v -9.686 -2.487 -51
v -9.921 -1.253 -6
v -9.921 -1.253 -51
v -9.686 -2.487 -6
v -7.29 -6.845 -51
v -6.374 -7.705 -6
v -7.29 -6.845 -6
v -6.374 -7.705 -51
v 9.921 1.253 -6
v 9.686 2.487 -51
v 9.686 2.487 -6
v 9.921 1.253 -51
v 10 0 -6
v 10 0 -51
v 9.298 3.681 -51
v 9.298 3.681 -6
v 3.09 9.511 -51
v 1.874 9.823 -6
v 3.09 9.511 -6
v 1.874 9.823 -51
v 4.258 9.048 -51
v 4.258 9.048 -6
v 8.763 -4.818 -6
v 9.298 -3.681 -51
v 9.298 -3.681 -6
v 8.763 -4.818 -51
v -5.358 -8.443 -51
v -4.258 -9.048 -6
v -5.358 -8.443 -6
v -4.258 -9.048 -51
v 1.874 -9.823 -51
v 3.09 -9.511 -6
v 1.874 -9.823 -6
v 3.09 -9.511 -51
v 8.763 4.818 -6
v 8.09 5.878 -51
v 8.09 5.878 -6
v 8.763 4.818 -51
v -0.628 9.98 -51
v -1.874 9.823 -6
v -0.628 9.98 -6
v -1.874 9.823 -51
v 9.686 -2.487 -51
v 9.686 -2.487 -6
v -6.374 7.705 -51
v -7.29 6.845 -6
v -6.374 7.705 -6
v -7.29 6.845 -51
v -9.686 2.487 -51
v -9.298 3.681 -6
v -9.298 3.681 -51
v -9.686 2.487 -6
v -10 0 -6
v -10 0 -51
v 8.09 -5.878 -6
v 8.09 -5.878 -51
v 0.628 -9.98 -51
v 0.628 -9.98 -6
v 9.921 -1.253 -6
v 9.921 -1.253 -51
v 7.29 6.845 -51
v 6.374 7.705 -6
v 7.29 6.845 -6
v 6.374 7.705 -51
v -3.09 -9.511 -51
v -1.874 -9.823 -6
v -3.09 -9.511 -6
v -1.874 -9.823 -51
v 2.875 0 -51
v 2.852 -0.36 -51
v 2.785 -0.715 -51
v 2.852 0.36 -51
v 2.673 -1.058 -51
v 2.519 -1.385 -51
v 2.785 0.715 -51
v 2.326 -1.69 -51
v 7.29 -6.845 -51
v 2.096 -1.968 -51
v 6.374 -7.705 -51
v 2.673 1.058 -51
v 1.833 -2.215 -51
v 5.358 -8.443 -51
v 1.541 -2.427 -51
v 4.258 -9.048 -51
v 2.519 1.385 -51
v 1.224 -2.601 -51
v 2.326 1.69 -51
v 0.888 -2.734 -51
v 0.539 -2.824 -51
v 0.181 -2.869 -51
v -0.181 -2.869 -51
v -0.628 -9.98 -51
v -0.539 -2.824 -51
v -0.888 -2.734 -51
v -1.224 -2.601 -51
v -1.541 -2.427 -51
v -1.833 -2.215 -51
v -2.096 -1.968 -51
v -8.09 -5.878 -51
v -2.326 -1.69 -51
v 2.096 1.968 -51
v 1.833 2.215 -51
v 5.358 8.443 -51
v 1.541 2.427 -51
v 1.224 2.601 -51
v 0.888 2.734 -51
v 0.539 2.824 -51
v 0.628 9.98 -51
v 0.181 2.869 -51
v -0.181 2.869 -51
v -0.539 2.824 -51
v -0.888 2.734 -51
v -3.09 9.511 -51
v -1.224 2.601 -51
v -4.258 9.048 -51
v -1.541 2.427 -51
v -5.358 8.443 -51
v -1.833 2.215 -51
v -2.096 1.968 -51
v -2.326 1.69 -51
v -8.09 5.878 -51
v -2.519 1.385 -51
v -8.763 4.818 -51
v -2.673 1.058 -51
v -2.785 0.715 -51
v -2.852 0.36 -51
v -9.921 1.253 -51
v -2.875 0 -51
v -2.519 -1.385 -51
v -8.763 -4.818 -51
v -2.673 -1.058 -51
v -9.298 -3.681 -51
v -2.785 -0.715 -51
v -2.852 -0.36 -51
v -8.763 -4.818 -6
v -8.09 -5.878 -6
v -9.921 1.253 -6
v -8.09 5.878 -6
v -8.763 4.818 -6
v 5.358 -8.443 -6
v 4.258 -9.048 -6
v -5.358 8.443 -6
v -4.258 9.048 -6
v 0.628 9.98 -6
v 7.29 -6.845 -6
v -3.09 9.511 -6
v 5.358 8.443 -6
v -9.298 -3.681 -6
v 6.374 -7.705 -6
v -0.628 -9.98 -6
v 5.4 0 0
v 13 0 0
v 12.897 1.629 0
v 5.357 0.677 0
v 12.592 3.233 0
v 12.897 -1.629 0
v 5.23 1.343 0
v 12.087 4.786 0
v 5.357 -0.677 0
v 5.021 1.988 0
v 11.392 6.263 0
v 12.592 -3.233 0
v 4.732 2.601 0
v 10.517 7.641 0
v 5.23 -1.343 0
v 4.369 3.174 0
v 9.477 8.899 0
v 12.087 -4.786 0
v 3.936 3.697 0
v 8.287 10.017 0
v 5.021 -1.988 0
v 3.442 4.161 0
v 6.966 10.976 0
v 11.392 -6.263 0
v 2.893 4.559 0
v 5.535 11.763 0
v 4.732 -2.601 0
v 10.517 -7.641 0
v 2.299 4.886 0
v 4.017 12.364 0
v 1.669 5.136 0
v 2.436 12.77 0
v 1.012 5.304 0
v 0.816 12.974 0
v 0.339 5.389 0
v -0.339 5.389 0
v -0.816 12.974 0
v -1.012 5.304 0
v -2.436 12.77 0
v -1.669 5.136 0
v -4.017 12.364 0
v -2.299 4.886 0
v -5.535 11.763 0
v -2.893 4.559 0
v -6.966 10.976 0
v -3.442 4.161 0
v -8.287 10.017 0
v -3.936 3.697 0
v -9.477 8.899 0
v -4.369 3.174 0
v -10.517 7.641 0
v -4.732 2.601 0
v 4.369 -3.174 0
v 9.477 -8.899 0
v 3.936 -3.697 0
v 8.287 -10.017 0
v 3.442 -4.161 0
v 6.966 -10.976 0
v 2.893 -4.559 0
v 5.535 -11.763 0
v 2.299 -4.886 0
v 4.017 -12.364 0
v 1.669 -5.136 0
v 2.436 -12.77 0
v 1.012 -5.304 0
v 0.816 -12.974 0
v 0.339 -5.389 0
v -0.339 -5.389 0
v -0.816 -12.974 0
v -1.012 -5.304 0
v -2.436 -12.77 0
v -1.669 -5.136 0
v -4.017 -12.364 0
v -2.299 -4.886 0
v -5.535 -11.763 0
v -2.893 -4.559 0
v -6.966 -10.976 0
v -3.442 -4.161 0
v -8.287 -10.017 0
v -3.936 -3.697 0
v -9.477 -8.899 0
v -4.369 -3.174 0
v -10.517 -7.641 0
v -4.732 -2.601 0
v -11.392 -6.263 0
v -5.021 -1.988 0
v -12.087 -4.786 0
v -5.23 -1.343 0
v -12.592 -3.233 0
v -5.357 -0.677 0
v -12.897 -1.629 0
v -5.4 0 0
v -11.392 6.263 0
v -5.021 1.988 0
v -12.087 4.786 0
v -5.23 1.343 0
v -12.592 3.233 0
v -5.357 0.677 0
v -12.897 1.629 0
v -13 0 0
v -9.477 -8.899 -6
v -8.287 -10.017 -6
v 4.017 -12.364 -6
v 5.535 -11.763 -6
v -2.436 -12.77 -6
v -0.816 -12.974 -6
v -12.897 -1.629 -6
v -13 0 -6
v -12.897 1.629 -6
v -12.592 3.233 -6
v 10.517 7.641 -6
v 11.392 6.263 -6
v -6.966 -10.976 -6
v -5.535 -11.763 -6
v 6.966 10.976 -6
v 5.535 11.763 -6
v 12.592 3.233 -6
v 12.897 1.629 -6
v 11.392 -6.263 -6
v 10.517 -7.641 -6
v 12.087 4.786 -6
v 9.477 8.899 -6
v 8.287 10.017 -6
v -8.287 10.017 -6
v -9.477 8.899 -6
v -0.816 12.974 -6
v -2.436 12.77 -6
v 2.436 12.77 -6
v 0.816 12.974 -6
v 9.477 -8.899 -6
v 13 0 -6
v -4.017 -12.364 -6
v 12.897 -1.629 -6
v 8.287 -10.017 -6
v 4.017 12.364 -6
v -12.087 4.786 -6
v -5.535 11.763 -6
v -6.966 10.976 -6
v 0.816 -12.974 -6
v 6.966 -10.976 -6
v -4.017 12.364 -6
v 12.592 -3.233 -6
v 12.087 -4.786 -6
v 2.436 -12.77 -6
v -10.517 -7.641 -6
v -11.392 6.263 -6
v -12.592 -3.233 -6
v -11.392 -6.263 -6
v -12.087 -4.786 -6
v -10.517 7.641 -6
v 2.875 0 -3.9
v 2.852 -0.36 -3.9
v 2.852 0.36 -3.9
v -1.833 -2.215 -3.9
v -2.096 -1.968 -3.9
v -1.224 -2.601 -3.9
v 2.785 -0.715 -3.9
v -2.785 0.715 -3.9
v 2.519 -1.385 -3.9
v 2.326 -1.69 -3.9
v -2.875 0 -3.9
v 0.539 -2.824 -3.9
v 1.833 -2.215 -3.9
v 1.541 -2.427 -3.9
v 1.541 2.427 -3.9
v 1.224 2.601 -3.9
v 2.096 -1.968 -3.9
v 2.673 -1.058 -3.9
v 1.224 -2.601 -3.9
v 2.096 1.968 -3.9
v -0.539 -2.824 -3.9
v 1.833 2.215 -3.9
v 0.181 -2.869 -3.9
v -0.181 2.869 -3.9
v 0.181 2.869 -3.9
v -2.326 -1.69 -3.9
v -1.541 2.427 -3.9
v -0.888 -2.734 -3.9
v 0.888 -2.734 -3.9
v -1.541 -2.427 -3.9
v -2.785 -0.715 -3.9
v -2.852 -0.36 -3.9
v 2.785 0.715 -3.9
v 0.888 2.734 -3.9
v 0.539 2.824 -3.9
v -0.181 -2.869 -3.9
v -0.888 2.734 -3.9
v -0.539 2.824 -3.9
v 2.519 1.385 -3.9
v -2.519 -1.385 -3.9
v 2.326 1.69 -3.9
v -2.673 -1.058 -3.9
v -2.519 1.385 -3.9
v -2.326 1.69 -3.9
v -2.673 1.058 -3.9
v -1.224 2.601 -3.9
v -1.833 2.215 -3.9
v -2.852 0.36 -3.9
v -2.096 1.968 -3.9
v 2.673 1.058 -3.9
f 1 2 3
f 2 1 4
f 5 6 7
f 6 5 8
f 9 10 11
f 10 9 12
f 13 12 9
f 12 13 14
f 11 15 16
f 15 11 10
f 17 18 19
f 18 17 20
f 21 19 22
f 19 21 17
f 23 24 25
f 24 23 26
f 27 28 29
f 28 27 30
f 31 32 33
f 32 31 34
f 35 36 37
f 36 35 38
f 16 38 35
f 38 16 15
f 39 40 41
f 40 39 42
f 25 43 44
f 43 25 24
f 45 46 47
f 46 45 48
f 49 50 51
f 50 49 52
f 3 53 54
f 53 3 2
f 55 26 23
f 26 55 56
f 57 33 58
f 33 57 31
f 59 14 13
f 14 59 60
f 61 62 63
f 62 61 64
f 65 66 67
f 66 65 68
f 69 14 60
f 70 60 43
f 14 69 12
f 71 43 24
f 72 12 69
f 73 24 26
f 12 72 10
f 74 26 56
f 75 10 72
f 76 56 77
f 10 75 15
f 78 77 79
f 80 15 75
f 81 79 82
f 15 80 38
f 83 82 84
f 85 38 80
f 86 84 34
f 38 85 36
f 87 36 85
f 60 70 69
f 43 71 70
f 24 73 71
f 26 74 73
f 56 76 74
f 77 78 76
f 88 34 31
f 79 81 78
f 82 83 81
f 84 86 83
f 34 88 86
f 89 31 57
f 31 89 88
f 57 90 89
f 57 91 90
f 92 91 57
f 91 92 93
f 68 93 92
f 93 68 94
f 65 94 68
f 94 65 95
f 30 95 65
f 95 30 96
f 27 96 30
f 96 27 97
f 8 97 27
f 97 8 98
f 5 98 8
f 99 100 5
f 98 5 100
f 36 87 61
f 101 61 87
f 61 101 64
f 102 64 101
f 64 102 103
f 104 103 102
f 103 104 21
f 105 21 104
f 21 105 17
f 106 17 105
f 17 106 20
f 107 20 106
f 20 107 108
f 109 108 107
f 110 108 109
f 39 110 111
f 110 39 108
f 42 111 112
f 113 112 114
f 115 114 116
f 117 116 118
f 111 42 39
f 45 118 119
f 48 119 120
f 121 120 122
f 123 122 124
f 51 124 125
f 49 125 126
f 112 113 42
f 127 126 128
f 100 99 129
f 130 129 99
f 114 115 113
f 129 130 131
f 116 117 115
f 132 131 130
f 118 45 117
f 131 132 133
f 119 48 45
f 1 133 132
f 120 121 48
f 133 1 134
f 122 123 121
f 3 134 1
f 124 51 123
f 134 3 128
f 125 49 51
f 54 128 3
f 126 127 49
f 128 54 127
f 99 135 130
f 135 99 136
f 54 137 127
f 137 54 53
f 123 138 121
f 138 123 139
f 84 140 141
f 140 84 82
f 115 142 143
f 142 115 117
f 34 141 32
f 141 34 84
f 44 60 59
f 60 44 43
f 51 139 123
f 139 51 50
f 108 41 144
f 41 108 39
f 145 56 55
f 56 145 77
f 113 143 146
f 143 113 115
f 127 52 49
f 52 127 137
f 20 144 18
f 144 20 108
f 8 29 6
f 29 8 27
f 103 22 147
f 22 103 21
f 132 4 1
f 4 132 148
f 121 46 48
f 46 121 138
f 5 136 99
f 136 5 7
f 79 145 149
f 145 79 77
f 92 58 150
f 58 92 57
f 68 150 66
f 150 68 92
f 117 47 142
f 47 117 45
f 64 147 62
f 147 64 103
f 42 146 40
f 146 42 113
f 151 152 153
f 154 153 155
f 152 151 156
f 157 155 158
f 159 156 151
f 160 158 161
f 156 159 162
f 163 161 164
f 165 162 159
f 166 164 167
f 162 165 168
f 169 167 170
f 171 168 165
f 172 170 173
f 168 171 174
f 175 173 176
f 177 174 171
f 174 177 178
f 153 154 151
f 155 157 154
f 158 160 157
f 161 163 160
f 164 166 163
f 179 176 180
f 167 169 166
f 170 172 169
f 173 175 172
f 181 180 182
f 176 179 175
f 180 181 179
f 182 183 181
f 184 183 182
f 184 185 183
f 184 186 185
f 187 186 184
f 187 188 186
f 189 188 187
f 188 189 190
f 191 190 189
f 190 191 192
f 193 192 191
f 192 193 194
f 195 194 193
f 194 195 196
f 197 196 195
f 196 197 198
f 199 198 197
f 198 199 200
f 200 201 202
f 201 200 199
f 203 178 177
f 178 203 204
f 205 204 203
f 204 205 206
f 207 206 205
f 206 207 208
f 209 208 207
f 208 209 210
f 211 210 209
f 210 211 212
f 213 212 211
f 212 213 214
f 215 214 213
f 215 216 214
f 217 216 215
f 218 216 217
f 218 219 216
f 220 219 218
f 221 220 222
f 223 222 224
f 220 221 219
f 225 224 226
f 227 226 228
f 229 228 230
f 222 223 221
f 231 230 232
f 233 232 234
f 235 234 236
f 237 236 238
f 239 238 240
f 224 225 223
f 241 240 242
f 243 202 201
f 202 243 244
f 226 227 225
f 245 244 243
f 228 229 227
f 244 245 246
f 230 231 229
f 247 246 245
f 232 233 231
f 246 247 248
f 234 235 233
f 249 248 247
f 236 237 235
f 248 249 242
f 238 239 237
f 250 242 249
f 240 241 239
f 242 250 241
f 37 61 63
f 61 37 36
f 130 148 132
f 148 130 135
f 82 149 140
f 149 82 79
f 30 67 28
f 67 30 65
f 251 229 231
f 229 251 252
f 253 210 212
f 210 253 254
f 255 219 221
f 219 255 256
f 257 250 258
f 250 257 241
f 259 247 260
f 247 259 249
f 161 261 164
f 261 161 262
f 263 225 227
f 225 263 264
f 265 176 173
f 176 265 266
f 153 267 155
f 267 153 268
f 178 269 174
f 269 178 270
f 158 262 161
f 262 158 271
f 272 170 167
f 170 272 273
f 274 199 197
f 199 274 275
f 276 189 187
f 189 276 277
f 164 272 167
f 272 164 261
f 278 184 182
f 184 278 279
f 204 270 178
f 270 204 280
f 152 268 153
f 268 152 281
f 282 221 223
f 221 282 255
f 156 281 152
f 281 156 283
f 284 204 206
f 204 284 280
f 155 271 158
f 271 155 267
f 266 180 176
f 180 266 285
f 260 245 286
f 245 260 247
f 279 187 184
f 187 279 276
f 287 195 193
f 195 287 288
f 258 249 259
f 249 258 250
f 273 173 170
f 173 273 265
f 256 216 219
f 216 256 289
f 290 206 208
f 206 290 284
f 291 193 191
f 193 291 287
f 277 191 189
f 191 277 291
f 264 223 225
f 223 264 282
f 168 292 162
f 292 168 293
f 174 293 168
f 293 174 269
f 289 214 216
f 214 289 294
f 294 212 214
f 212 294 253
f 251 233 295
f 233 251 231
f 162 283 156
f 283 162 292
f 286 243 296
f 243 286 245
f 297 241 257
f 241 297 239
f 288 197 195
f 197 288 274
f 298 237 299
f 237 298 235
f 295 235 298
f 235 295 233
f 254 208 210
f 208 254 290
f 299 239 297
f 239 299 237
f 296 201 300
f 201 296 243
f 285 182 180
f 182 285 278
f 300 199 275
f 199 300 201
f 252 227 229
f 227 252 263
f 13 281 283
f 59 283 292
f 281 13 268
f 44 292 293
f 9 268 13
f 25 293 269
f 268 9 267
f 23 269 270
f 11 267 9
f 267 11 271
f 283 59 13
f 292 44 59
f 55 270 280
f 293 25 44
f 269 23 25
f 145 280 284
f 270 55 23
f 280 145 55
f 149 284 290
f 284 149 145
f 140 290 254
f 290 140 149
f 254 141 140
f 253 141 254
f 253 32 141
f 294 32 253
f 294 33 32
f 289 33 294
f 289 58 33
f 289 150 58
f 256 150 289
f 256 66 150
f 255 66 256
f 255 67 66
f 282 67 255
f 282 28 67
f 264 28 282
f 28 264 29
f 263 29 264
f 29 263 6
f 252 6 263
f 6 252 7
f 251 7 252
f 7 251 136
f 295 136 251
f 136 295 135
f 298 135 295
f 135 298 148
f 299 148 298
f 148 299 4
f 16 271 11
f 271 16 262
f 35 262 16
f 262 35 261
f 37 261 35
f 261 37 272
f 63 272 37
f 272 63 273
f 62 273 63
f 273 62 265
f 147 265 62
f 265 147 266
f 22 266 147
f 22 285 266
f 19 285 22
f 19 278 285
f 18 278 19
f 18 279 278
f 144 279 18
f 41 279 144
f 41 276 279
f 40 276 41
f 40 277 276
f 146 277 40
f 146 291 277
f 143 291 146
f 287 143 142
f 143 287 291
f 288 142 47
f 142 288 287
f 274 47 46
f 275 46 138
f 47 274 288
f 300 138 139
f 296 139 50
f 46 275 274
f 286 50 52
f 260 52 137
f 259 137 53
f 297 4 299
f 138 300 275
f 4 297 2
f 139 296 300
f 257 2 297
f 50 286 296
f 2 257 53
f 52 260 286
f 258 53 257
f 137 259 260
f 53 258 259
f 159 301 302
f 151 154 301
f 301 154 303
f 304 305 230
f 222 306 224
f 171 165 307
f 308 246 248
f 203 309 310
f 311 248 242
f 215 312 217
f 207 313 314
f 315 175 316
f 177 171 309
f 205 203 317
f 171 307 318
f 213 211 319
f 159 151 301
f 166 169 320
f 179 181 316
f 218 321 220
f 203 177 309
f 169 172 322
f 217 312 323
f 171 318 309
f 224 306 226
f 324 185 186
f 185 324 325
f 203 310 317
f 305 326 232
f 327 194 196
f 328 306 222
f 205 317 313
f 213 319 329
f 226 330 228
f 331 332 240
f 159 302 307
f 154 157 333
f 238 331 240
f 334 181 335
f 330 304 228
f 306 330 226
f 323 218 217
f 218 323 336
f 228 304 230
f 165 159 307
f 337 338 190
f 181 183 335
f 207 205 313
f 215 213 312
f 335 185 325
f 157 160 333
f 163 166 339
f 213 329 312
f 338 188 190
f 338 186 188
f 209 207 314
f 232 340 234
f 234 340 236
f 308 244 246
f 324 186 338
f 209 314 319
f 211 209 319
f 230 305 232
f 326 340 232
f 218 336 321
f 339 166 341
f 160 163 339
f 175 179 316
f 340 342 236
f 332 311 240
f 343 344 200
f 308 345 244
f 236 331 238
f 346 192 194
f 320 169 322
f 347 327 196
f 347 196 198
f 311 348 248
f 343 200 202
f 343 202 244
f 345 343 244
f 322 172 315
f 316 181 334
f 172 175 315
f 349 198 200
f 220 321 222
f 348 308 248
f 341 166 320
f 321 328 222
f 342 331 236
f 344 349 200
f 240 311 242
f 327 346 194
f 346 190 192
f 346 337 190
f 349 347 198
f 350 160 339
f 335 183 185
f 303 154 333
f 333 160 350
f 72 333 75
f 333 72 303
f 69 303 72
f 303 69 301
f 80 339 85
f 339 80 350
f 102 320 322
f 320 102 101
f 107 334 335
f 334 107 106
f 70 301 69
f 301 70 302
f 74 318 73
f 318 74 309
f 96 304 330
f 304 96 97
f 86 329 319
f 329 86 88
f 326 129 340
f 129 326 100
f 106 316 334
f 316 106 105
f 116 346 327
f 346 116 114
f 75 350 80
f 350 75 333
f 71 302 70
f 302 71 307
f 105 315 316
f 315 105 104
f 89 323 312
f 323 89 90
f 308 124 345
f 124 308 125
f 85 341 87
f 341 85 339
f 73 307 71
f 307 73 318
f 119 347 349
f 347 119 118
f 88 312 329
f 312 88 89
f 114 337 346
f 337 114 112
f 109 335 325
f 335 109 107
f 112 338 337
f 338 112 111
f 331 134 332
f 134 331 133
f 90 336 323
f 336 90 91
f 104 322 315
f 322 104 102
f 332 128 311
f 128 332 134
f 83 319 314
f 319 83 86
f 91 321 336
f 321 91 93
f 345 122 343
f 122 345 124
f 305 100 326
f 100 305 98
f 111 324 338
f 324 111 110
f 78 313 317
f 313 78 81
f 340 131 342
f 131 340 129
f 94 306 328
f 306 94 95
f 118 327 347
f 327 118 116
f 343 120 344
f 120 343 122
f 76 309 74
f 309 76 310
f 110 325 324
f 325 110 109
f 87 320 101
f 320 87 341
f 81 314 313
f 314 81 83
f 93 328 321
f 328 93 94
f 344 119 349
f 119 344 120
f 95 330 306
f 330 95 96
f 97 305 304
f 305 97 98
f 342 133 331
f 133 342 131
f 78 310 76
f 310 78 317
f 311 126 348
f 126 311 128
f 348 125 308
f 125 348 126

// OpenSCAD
$fn = 50;


difference() {
	union() {
		translate(v = [0, 0, -51.0000000000]) {
			cylinder(h = 51, r = 10.0000000000);
		}
		translate(v = [0, 0, -6.0000000000]) {
			cylinder(h = 6, r = 13.0000000000);
		}
	}
	union() {
		translate(v = [0, 0, 0]) {
			rotate(a = [0, 0, 0]) {
				difference() {
					union() {
						#translate(v = [0, 0, -51.0000000000]) {
							cylinder(h = 51, r = 2.6000000000);
						}
						#translate(v = [0, 0, -3.9000000000]) {
							cylinder(h = 3.9000000000, r1 = 2.8750000000, r2 = 5.4000000000);
						}
						#translate(v = [0, 0, -51.0000000000]) {
							cylinder(h = 51, r = 2.8750000000);
						}
						#translate(v = [0, 0, -51.0000000000]) {
							cylinder(h = 51, r = 2.6000000000);
						}
					}
					union();
				}
			}
		}
	}
}
